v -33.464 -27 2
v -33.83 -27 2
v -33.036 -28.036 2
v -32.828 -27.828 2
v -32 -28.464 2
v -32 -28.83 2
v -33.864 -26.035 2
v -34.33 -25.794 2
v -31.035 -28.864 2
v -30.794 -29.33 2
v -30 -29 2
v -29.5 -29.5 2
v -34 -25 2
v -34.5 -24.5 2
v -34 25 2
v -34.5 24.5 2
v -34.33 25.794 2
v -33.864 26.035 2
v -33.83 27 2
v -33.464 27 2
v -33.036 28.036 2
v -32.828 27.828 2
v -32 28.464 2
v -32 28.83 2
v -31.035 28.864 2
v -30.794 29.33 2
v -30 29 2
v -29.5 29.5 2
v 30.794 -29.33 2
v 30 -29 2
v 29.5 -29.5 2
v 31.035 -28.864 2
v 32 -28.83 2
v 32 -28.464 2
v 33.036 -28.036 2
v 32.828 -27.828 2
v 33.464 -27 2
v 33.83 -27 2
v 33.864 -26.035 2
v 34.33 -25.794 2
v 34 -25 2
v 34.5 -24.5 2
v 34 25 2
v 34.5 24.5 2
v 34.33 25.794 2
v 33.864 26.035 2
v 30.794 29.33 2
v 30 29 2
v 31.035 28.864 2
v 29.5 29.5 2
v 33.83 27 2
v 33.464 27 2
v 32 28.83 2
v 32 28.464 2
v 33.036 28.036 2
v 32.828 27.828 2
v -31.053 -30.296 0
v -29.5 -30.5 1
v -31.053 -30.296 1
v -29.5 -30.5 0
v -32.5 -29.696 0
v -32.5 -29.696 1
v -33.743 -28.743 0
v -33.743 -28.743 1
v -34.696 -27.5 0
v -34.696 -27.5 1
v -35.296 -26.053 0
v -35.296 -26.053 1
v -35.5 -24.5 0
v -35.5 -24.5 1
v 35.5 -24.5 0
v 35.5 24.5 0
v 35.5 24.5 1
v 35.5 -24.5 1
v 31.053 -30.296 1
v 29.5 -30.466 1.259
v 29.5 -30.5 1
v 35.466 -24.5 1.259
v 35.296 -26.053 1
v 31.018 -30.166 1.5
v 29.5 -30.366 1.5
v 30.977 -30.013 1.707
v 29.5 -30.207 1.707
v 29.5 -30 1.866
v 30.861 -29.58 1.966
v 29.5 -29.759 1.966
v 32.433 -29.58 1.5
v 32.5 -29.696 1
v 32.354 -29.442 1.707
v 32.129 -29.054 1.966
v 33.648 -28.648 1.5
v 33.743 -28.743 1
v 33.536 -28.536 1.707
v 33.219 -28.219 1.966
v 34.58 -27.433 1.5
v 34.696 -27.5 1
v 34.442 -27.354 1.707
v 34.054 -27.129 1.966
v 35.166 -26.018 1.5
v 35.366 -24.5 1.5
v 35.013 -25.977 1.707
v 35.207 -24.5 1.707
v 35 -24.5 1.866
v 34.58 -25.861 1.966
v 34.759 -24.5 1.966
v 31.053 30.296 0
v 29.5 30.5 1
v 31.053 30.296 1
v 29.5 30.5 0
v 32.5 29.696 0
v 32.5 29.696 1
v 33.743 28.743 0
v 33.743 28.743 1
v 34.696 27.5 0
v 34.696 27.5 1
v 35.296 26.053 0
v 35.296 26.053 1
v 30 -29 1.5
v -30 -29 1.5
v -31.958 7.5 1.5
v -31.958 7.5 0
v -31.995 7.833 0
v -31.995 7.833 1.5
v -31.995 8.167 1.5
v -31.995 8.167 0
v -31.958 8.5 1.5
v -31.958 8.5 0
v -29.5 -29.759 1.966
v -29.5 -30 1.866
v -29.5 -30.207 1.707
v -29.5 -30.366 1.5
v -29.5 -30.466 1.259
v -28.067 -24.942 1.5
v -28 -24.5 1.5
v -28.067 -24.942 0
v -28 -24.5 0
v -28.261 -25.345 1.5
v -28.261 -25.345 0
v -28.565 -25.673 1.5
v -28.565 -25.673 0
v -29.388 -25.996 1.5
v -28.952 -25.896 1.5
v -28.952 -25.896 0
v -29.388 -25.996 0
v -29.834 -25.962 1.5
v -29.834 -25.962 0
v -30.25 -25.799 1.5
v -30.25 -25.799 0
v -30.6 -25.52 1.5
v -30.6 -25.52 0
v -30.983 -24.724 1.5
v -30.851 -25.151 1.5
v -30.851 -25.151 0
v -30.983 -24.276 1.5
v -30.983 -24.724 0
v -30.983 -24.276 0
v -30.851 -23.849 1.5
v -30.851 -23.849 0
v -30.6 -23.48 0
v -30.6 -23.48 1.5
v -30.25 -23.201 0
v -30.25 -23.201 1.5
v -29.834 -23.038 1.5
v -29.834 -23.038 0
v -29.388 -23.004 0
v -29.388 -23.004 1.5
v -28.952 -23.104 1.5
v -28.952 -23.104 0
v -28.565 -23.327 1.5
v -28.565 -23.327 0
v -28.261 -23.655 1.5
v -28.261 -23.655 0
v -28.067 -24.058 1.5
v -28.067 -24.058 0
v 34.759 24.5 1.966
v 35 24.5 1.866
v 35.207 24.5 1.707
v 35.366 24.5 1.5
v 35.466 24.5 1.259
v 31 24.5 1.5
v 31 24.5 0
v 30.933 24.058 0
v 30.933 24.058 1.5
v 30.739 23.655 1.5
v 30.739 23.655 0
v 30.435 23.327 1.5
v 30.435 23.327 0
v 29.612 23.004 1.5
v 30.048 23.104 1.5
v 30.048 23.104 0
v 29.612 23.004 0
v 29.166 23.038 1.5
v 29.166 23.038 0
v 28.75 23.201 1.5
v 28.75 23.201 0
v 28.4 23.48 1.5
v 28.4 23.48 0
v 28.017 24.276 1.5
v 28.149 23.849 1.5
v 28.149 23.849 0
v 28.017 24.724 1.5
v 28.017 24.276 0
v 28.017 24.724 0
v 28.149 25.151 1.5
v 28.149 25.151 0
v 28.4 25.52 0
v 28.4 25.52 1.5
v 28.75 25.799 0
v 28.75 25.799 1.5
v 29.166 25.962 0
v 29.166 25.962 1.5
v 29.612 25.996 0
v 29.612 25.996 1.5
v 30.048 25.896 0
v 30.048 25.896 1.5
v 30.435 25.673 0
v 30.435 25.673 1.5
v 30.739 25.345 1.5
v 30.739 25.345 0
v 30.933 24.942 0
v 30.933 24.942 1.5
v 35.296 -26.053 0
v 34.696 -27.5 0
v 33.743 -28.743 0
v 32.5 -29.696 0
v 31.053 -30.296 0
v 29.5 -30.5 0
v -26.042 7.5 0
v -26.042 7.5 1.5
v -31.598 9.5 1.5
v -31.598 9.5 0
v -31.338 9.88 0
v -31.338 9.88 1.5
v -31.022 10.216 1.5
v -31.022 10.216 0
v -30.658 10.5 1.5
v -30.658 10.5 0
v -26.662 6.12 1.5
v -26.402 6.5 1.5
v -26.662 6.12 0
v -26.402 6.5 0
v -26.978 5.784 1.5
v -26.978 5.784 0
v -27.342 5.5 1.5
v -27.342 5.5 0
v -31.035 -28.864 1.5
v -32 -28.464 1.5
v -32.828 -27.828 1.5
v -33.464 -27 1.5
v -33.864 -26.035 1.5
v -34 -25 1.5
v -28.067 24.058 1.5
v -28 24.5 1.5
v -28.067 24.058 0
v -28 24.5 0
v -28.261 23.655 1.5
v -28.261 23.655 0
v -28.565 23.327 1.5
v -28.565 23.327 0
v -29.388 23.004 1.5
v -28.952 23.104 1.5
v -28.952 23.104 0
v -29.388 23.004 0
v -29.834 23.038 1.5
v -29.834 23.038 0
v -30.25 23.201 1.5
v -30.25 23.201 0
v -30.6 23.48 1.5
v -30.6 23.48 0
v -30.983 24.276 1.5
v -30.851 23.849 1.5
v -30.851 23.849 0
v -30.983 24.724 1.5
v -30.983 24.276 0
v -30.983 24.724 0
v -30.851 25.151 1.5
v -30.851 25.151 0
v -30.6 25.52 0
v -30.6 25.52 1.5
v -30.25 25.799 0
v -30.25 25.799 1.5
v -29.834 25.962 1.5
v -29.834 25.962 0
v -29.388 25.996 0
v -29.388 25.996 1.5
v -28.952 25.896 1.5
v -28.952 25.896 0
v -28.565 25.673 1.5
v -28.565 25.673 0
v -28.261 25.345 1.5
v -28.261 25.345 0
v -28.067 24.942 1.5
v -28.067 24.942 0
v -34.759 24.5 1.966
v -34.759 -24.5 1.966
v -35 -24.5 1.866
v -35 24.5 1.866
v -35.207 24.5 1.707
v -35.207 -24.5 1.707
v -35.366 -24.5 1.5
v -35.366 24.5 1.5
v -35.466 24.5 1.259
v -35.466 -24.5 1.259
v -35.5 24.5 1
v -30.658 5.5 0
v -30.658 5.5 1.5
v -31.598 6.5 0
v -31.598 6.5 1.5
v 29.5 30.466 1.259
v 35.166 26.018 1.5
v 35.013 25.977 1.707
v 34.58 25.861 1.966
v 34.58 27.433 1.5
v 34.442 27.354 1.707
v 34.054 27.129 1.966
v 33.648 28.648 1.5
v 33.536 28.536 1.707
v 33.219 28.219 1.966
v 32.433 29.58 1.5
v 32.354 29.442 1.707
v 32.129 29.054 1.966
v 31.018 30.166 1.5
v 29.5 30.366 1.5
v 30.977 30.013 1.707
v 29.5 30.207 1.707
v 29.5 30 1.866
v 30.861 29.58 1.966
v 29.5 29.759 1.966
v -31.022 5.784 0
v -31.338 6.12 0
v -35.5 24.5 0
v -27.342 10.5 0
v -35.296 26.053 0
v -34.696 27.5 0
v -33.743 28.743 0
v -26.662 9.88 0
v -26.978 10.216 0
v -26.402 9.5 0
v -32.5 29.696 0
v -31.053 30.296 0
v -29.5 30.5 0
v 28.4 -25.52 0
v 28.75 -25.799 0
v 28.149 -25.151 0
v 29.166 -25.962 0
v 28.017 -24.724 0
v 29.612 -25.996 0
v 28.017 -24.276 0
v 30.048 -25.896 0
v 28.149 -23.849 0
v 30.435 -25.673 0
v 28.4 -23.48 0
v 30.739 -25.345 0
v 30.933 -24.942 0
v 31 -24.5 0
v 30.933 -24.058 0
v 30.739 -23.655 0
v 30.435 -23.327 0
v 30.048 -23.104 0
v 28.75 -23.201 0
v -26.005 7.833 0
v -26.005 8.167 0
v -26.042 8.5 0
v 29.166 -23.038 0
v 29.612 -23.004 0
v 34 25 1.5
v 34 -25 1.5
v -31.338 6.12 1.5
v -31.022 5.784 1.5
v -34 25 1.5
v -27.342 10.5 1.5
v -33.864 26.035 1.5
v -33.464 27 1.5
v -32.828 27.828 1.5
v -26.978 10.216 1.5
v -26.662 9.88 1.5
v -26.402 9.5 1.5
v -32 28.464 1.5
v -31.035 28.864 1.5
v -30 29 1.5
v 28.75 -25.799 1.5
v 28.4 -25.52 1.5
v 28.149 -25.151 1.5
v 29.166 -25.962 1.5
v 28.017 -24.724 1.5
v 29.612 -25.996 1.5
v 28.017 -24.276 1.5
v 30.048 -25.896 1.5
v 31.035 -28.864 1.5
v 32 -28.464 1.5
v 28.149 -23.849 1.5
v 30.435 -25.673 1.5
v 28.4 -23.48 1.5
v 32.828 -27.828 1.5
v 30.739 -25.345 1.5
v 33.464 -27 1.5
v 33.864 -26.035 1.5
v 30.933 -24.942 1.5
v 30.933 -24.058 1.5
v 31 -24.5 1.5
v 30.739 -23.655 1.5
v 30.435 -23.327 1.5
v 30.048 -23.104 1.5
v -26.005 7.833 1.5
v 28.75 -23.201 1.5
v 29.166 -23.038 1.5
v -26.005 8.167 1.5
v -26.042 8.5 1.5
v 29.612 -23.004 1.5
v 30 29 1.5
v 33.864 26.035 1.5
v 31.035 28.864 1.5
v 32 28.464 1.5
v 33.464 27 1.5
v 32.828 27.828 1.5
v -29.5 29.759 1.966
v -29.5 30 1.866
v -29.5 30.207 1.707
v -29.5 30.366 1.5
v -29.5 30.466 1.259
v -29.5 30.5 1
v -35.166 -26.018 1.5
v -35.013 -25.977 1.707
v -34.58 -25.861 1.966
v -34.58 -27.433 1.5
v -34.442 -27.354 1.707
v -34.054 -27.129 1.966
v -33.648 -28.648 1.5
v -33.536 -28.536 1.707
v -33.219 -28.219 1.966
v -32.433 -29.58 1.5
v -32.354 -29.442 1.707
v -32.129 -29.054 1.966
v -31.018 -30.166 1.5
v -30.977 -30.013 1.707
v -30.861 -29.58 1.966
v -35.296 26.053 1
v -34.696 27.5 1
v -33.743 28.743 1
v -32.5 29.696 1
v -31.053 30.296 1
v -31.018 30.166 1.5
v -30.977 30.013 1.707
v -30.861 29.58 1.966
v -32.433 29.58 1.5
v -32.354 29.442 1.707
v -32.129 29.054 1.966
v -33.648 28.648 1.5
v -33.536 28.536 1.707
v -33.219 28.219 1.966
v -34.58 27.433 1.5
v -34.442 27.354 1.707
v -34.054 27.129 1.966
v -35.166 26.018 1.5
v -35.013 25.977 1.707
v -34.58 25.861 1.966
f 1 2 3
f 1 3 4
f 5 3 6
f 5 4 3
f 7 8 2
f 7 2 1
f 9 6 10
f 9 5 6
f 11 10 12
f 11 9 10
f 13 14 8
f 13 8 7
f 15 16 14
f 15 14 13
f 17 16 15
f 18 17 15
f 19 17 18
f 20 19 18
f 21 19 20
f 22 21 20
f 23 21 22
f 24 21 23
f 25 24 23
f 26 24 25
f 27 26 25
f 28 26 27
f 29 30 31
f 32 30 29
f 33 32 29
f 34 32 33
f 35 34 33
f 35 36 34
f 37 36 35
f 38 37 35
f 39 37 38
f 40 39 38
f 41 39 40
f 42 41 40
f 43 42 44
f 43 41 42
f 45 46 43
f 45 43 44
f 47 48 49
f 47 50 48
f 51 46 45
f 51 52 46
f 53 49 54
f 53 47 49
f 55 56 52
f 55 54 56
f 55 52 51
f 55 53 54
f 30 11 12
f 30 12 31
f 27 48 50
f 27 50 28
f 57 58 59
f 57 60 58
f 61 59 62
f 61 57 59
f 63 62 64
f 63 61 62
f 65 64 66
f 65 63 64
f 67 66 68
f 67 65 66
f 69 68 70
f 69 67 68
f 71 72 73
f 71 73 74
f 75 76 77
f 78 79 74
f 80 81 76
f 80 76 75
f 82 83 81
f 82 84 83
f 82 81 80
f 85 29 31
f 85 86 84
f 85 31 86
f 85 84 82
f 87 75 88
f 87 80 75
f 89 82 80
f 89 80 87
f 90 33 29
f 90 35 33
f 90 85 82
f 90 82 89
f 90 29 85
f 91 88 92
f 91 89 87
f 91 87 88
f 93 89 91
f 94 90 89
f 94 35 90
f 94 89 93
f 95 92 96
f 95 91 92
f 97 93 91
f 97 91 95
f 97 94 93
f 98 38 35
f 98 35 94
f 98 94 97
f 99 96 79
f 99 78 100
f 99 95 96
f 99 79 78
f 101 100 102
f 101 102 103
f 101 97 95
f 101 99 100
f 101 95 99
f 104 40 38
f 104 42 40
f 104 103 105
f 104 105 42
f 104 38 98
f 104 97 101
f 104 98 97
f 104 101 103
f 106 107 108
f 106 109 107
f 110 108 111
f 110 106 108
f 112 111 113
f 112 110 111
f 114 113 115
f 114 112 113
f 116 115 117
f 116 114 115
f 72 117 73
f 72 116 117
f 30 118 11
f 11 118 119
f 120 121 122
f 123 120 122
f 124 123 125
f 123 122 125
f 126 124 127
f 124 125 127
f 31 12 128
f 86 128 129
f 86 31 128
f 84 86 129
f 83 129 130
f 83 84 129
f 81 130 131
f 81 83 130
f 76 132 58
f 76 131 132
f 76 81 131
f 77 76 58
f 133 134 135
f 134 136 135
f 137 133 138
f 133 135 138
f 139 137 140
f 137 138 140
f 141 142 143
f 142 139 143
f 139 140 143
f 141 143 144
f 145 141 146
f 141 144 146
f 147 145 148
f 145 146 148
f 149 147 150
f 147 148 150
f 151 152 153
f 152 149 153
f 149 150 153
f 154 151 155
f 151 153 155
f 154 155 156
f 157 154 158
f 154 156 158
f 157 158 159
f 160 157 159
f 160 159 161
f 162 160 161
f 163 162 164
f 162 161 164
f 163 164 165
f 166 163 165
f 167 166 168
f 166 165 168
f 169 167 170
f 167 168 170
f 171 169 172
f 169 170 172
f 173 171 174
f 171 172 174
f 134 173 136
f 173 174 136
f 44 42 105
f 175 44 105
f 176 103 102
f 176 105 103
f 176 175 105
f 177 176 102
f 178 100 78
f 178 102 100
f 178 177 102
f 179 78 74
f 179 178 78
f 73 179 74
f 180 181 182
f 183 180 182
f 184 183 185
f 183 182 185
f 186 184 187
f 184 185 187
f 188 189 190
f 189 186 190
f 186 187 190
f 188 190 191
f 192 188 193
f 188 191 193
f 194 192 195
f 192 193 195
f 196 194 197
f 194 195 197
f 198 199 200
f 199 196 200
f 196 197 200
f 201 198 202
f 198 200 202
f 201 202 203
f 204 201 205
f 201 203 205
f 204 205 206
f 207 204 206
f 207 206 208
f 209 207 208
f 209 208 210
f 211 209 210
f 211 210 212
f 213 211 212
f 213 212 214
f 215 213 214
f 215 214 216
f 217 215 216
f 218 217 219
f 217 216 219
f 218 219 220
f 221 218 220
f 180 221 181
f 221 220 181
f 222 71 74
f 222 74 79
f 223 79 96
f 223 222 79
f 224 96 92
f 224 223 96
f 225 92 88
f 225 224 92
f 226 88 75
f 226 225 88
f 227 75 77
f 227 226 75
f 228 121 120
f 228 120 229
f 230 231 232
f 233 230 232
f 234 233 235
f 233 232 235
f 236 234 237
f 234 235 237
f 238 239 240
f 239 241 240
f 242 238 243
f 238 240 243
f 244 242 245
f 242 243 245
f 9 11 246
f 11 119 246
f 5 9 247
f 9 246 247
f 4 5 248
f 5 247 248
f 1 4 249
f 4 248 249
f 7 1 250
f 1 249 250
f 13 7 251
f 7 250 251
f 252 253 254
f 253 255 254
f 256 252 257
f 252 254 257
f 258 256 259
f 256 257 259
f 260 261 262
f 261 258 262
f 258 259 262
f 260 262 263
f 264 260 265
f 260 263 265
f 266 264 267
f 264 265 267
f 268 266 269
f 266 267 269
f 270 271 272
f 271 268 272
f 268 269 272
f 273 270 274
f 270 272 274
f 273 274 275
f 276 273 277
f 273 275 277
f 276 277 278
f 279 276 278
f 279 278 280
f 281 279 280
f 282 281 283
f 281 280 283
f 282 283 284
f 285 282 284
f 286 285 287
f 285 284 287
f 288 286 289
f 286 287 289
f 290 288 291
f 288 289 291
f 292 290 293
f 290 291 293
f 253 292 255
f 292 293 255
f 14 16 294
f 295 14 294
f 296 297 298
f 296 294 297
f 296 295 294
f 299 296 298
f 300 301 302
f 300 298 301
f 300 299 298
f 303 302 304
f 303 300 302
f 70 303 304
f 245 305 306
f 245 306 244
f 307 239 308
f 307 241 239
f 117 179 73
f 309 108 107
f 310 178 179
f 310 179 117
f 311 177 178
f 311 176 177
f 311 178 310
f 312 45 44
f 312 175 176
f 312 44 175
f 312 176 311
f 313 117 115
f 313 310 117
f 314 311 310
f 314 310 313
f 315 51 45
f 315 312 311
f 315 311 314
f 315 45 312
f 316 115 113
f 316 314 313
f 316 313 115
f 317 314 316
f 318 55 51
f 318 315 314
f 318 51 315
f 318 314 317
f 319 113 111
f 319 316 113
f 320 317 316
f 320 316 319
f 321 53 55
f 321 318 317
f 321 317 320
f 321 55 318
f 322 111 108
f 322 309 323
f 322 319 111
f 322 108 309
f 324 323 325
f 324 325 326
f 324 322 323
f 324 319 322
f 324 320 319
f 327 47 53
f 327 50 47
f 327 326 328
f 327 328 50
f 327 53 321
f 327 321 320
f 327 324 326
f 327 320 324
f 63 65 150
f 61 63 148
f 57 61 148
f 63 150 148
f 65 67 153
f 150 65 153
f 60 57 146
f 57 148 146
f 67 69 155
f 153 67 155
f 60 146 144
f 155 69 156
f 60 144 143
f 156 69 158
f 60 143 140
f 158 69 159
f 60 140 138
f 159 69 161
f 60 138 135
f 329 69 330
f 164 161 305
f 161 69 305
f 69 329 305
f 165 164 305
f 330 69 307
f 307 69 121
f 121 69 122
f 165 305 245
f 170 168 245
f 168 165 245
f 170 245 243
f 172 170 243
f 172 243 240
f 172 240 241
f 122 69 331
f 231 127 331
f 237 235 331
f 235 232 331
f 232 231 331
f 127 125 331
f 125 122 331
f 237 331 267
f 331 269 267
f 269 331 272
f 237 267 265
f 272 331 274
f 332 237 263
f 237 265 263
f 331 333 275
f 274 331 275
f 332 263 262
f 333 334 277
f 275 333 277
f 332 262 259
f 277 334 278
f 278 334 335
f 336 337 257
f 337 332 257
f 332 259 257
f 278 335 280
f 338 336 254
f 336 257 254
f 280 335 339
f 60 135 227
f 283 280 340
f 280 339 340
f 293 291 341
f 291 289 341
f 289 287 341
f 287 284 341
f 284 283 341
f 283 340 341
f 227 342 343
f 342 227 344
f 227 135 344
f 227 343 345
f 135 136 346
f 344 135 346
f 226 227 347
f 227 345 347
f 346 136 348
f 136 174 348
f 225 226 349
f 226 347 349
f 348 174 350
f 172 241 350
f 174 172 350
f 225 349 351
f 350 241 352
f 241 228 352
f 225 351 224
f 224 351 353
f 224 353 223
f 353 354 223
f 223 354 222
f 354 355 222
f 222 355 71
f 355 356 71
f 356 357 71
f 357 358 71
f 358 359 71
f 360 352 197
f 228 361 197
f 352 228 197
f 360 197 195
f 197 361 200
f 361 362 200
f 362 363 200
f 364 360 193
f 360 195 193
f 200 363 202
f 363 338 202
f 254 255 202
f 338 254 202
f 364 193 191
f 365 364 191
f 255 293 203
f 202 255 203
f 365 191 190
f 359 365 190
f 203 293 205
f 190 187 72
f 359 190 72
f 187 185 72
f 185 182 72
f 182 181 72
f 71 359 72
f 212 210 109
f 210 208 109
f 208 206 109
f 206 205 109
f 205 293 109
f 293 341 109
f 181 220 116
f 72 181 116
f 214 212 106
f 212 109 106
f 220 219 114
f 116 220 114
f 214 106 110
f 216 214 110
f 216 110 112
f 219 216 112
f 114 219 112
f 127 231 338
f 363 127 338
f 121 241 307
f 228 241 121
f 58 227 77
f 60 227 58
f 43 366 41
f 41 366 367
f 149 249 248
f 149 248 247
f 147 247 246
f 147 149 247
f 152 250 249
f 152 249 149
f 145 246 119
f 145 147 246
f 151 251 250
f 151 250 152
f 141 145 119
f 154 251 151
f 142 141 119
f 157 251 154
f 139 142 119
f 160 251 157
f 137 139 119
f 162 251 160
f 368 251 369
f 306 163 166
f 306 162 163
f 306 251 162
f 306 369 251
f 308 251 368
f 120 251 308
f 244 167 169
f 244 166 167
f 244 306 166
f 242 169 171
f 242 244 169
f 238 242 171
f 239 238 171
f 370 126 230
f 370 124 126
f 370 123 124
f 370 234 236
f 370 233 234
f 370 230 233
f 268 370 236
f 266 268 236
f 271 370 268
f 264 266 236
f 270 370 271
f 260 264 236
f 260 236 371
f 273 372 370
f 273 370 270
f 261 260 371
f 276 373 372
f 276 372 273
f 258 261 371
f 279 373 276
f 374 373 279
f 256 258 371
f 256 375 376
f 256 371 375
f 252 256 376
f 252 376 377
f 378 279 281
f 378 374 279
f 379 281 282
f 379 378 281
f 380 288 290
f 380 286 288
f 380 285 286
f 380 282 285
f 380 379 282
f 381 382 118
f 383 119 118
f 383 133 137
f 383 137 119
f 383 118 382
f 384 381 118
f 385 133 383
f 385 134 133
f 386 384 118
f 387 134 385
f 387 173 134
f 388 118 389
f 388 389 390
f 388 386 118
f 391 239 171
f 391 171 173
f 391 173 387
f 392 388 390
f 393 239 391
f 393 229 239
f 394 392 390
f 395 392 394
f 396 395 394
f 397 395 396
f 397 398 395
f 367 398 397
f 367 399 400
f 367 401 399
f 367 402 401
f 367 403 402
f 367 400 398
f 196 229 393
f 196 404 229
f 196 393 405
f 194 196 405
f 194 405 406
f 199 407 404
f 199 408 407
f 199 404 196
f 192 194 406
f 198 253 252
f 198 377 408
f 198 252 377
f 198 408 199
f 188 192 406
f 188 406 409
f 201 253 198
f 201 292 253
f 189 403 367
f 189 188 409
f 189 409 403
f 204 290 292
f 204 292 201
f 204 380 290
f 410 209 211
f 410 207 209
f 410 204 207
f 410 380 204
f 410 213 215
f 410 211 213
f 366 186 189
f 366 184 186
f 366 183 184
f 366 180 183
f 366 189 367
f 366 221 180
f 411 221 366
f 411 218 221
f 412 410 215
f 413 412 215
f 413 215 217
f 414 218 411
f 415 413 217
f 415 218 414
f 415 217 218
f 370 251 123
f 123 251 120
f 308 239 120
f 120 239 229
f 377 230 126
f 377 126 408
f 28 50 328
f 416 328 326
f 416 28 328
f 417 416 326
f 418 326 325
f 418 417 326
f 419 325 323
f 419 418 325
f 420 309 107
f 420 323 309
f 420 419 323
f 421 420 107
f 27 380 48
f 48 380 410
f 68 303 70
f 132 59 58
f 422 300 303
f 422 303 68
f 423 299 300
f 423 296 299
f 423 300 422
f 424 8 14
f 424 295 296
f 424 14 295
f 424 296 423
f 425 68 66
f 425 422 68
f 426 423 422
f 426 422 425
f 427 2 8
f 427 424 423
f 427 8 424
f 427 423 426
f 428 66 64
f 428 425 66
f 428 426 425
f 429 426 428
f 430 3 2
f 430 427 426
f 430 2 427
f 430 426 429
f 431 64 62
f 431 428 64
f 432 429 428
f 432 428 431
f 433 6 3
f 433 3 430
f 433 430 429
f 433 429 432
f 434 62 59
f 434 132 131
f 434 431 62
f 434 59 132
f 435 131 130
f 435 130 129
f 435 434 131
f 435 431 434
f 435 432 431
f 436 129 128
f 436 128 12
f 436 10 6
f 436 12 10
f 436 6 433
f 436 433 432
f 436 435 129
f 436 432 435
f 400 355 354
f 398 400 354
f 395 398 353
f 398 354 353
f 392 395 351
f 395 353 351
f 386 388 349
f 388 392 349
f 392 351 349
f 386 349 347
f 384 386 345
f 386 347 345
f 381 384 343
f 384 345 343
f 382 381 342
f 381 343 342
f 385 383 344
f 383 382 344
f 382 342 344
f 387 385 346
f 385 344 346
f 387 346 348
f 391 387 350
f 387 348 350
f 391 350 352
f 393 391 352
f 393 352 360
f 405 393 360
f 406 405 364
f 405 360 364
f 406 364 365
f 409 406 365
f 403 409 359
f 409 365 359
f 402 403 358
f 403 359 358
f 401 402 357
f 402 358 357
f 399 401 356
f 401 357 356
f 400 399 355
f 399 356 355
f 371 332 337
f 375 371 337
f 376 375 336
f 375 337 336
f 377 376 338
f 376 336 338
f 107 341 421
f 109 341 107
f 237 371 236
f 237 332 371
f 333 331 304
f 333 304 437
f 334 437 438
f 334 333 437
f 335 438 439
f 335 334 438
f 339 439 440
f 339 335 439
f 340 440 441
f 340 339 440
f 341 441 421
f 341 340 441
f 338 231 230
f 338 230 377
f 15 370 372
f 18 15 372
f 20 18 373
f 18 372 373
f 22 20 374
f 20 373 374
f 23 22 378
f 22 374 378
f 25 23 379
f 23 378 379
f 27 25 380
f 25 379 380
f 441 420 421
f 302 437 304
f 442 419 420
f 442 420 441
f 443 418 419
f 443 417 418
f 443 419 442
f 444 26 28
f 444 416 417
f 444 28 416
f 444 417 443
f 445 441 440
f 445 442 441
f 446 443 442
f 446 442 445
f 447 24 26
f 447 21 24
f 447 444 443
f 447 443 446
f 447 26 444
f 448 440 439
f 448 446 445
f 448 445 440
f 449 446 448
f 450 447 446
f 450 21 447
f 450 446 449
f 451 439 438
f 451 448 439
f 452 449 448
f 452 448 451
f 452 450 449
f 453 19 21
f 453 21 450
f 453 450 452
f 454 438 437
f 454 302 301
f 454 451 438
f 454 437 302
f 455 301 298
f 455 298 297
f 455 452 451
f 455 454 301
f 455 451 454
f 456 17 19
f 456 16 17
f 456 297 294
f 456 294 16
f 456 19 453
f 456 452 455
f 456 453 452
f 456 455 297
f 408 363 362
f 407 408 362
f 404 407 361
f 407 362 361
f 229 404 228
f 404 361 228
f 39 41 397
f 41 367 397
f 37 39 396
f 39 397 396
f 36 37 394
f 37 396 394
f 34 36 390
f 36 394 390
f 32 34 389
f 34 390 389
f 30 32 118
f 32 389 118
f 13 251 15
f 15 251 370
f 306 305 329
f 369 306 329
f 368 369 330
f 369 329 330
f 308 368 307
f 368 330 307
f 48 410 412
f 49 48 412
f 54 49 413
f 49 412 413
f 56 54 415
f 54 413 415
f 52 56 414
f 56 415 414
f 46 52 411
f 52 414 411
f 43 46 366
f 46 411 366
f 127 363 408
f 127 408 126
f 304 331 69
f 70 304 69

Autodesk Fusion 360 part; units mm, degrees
sketch "Sketch1" plane through (0, 0, 0) normal (0, 0, 1) x (1, 0, 0)
  arc A0 (29.5, -30.5) -> (35.5, -24.5) centre (29.5, -24.5) ccw
  arc A1 (35.5, 24.5) -> (29.5, 30.5) centre (29.5, 24.5) ccw
  circle A2 centre (29.5, 24.5) radius 1.5
  line L0 (-35.5, 24.5) -> (-35.5, -24.5)
  line L1 (29.5, -30.5) -> (-29.5, -30.5)
  line L2 (-29.5, 30.5) -> (29.5, 30.5)
  arc A3 (34, 25) -> (30, 29) centre (30, 25) ccw
  circle A4 centre (29.5, -24.5) radius 1.5
  arc A5 (30, -29) -> (34, -25) centre (30, -25) ccw
  line L3 (30, -29) -> (-30, -29)
  arc A6 (-34, -25) -> (-30, -29) centre (-30, -25) ccw
  line L4 (0, -27.5) -> (0.5, -27.5) construction
  arc A7 (-35.5, -24.5) -> (-29.5, -30.5) centre (-29.5, -24.5) ccw
  line L5 (-30, 29) -> (30, 29)
  arc A8 (-29.5, 30.5) -> (-35.5, 24.5) centre (-29.5, 24.5) ccw
  line L6 (0, 27.5) -> (0.5, 27.5) construction
  circle A9 centre (-29.5, 24.5) radius 1.5
  arc A10 (-30, 29) -> (-34, 25) centre (-30, 25) ccw
  line L7 (0, -27.5) -> (0.5, -27.5) construction
  line L8 (-34, -25) -> (-34, 25)
  circle A11 centre (-29.5, -24.5) radius 1.5
  line L9 (0, -27.5) -> (0.5, -27.5)
  arc A12 (-29.5, 30.5) -> (-35.5, 24.5) centre (-29.5, 24.5) ccw
  line L10 (34, 25) -> (34, -25)
  line L11 (35.5, 24.5) -> (35.5, -24.5)
  line L12 (-35.5, 0) -> (-30.5, 0) construction
  line L13 (-29, 8.5) -> (-29, 9.5) construction
  line L14 (-26.042, 8.5) -> (-31.958, 8.5)
  line L15 (-31.958, 7.5) -> (-26.042, 7.5)
  line L16 (-29, 8.5) -> (-29, 10) construction
  line L17 (-27.3417, 10.5) -> (-30.6583, 10.5)
  line L18 (-31.5981, 9.5) -> (-26.4019, 9.5)
  line L19 (-29, 7.5) -> (-29, 6) construction
  arc A13 (-30.6583, 10.5) -> (-31.5981, 9.5) centre (-29, 8) ccw
  arc A14 (-26.4019, 9.5) -> (-27.3417, 10.5) centre (-29, 8) ccw
  line L20 (-32, 8.5) -> (-31.9592, 8.4932) construction
  line L21 (-26.0408, 7.5068) -> (-26, 7.5) construction
  line L22 (-26.4019, 6.5) -> (-31.5981, 6.5)
  line L23 (-30.6583, 5.5) -> (-27.3417, 5.5)
  arc A15 (-31.958, 8.5) -> (-31.958, 7.5) centre (-29, 8) ccw
  arc A16 (-26.042, 7.5) -> (-26.042, 8.5) centre (-29, 8) ccw
  arc A17 (-31.5981, 6.5) -> (-30.6583, 5.5) centre (-29, 8) ccw
  arc A18 (-27.3417, 5.5) -> (-26.4019, 6.5) centre (-29, 8) ccw
  point P0 (-29, 8)
  point P1 (-29, 8)
  point P2 (-29, 10)
  point P3 (-29, 6)
  point P4 (-29, 6)
  dimension "d1" = 3
  dimension "d2" = 3
  dimension "d3" = 3
  dimension "d4" = 3
  dimension "d25" = 1.5
extrude "Extrude3" add sketch "Sketch1" along normal blind 2 contours A0 A1 L0 L1 L2 A7 A8 A12 L11
fillet "Fillet1" radius 1 8 edges at (-33.7426, 28.7426, 2) (-35.5, 0, 2) (-33.7426, -28.7426, 2) (0, -30.5, 2) (33.7426, -28.7426, 2) (35.5, 0, 2) (33.7426, 28.7426, 2) (0, 30.5, 2)
extrude "Extrude4" add sketch "Sketch1" along normal blind 1.5 contours A3 A5 L3 A6 L5 A10 L8 L10
extrude "Extrude2" [suppressed]
